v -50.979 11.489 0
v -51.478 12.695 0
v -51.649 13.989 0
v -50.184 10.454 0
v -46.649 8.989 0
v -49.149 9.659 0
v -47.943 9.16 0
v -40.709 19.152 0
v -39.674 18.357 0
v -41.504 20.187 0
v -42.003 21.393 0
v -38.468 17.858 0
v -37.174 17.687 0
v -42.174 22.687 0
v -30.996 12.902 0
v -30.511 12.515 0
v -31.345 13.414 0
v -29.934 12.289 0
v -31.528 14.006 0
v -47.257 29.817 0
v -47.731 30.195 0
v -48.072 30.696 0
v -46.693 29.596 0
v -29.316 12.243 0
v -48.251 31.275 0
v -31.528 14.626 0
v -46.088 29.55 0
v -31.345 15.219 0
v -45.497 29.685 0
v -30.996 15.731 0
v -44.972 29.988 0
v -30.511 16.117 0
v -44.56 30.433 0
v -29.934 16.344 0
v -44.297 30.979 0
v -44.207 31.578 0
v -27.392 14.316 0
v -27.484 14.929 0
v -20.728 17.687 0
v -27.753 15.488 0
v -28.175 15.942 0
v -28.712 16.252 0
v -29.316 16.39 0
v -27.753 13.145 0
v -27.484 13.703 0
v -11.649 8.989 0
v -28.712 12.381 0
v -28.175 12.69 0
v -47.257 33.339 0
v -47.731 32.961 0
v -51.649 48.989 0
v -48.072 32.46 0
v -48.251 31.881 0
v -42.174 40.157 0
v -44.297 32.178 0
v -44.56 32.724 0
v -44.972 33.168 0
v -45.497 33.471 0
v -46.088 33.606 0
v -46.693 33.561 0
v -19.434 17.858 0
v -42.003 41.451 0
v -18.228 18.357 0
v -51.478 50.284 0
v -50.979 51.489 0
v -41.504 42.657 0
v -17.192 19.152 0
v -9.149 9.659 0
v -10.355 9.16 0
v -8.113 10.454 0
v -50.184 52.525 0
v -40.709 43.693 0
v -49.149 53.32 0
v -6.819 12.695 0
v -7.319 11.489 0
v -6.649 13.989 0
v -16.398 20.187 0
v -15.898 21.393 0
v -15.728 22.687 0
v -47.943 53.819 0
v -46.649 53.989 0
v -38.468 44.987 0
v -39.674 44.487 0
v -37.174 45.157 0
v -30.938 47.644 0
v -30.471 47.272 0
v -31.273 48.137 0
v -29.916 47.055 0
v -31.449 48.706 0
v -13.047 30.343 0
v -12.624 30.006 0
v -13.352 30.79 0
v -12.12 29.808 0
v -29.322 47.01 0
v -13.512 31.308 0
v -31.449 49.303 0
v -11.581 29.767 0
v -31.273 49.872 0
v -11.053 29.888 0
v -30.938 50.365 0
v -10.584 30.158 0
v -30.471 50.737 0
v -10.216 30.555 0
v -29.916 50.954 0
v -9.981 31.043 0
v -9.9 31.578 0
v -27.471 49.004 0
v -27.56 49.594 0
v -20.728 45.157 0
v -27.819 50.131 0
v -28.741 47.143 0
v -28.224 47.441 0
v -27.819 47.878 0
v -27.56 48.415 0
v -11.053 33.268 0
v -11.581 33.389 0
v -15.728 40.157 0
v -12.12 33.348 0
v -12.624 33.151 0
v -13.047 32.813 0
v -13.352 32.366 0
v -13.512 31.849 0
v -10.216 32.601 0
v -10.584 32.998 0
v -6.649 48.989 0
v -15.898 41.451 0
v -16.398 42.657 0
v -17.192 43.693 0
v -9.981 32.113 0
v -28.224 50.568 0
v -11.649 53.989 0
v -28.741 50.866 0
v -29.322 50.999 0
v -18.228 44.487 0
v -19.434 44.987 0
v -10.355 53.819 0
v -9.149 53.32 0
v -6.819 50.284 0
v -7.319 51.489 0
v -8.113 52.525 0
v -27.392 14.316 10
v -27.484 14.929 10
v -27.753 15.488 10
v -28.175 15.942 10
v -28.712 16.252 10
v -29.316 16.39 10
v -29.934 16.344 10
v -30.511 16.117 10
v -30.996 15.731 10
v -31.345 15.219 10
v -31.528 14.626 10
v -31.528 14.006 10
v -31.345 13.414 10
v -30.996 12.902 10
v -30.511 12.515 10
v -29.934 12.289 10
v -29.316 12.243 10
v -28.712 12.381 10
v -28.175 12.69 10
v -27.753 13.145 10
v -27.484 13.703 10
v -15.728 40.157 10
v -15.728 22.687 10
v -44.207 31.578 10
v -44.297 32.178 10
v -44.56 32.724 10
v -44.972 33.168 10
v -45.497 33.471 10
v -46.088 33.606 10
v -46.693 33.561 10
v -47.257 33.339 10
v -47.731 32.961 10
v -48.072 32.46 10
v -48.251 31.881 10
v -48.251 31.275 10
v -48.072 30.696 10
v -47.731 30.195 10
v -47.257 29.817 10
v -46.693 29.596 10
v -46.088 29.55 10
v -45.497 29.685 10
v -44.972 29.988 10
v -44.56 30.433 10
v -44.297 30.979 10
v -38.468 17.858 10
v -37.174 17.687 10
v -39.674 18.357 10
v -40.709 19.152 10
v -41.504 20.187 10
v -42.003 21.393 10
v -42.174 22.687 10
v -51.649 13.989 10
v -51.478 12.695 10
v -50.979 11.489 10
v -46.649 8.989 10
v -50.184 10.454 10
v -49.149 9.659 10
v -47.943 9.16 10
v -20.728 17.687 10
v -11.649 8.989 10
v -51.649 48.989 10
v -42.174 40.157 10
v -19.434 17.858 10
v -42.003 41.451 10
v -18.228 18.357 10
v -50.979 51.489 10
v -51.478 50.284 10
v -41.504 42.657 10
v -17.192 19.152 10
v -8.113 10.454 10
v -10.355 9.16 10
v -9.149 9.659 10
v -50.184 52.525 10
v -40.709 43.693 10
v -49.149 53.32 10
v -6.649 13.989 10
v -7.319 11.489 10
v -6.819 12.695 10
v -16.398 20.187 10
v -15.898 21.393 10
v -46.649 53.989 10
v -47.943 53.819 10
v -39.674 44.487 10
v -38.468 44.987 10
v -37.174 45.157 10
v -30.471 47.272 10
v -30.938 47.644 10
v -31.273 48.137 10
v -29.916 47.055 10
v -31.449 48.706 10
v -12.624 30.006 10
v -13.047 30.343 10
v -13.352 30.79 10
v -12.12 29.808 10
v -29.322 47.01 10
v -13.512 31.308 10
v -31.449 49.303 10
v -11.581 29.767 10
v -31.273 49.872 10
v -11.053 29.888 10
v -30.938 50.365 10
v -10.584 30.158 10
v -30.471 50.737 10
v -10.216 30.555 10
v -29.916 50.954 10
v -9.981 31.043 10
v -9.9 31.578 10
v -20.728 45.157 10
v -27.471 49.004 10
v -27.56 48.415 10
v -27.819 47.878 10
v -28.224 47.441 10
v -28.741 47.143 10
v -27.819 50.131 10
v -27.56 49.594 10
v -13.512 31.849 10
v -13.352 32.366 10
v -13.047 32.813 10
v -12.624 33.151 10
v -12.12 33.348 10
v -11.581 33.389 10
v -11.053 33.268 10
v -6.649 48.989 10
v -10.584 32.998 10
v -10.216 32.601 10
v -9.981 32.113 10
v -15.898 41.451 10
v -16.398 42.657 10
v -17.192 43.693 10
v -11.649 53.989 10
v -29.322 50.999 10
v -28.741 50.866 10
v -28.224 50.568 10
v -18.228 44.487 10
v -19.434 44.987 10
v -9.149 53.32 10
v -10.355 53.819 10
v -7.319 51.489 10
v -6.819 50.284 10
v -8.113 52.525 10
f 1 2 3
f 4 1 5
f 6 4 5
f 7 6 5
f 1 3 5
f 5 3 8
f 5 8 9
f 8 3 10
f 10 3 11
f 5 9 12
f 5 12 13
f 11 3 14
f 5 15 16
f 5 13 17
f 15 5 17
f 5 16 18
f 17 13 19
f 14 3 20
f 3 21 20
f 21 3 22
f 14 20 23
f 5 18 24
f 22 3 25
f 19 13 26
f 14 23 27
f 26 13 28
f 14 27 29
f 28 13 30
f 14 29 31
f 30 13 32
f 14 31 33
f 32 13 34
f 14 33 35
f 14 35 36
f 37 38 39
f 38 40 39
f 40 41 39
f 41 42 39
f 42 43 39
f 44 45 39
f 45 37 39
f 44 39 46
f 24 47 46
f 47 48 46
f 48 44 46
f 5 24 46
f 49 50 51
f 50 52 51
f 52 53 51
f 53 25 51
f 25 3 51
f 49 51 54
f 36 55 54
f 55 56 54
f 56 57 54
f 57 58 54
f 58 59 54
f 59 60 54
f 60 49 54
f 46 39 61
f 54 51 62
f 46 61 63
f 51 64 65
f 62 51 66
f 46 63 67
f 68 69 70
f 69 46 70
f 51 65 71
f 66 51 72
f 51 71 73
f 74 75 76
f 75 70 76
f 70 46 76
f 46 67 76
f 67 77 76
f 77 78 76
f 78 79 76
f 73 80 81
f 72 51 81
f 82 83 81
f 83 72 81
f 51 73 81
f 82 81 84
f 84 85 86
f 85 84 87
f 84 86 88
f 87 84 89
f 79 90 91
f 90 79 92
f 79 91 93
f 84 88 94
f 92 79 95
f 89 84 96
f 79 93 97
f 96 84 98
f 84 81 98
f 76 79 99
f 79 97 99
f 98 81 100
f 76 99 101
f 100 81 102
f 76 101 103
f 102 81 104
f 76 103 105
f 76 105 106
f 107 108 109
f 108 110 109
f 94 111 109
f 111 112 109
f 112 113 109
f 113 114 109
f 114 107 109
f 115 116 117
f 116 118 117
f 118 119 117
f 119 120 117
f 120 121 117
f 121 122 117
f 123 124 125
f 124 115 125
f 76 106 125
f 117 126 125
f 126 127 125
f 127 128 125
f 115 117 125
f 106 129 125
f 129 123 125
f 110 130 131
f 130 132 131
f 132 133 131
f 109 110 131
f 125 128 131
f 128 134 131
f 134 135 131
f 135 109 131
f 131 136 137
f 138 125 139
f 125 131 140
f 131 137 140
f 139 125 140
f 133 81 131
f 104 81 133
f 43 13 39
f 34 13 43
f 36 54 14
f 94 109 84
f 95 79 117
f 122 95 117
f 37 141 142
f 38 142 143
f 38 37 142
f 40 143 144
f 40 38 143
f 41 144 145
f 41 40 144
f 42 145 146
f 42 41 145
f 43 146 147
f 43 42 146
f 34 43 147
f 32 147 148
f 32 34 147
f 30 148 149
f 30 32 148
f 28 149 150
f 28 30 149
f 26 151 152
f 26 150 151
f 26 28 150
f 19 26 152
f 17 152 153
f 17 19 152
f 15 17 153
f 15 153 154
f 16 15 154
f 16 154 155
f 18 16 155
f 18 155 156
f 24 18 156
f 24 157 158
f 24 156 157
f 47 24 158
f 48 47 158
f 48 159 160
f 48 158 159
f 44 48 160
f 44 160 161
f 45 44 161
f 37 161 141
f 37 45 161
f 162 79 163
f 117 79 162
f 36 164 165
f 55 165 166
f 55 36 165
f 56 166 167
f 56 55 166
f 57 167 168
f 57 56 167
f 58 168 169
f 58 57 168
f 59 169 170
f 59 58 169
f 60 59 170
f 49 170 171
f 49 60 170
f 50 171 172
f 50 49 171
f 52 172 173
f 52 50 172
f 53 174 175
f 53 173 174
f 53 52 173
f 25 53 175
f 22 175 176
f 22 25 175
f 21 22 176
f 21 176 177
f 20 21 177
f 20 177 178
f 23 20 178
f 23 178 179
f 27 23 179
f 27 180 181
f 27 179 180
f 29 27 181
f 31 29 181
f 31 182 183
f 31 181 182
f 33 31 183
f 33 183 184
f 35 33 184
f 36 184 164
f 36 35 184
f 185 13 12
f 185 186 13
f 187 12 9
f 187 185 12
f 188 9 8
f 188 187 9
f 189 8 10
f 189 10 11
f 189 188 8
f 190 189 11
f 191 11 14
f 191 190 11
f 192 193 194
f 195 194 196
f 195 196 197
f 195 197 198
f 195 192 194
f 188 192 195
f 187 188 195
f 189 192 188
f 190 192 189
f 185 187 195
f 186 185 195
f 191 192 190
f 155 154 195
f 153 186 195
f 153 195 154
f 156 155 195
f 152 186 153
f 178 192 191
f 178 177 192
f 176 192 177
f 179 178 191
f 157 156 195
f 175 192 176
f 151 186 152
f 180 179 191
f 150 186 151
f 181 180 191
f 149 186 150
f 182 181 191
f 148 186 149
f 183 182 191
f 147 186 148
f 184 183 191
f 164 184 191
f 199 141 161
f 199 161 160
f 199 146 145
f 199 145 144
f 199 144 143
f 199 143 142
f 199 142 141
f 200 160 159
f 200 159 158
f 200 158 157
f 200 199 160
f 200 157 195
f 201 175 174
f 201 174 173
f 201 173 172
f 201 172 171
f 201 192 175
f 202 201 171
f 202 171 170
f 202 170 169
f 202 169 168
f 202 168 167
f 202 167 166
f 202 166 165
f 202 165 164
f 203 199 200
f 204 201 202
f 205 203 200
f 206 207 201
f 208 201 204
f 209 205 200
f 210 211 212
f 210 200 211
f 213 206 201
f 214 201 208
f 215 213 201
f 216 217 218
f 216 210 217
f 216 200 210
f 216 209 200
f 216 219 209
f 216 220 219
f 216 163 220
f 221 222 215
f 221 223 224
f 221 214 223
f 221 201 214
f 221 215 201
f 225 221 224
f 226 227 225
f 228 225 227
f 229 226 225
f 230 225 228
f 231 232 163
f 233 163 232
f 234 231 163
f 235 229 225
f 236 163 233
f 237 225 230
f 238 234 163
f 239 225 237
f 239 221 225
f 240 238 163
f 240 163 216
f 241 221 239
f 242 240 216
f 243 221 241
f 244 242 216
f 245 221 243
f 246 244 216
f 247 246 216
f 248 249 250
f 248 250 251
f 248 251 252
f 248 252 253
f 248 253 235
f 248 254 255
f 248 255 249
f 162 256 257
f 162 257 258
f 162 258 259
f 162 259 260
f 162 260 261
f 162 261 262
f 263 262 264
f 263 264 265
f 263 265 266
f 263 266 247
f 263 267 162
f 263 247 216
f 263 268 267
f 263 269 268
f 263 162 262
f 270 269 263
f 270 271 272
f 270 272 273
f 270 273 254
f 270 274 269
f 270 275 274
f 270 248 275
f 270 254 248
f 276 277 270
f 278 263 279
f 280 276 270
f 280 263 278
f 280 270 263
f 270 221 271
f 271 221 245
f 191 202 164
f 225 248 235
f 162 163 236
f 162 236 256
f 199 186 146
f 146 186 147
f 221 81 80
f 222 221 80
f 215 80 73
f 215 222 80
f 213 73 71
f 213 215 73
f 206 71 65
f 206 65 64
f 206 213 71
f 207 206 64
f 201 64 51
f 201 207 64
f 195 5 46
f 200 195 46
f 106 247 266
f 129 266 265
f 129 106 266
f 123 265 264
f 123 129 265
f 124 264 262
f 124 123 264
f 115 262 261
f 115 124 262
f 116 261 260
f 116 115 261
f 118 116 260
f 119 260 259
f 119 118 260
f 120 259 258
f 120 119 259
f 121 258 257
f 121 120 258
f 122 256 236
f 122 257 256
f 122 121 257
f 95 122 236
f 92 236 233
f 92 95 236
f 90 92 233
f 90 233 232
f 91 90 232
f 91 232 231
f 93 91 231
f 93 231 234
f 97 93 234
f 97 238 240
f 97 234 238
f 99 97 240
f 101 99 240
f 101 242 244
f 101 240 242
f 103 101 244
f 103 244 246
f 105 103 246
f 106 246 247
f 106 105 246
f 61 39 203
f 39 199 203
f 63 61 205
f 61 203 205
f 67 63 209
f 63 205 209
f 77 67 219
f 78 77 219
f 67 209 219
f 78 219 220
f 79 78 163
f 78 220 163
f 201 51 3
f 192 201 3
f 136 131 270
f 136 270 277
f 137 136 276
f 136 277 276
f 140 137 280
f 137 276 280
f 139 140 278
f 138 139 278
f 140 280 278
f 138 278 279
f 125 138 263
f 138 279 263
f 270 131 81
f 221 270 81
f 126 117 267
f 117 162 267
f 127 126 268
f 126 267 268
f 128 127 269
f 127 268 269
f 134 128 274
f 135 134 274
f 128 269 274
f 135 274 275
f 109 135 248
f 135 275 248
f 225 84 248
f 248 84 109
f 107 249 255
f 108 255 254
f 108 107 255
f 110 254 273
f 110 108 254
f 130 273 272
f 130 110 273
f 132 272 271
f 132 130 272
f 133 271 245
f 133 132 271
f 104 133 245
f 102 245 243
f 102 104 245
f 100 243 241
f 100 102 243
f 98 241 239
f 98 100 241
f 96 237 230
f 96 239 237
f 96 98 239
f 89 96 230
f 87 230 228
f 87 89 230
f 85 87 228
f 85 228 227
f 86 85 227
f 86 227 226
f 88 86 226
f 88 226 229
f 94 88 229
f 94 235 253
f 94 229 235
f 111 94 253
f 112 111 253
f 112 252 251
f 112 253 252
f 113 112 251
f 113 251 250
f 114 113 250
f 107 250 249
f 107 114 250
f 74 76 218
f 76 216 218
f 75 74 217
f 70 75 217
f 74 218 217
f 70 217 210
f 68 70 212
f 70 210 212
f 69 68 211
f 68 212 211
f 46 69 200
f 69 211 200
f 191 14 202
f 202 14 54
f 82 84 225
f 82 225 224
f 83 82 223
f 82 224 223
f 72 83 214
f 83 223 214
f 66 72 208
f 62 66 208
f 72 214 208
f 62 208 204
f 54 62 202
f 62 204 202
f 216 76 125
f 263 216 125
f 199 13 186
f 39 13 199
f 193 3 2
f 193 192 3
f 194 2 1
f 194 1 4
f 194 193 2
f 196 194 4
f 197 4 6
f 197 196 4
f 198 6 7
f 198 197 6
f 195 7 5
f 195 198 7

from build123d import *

# Parameters (mm, degrees)
F0_W     = 23.217392
F0_H     = 21.835592
F1_DEPTH = 10
F2_W     = 26.445957
F2_H     = 27.469668
F3_DEPTH = 25
F4_R     = 5
F5_R     = 5
F6_R     = 2
F6_R_2   = 2.033505
F6_R_3   = 2.079501
F6_R_4   = 1.815846
F7_DEPTH = 25


with BuildPart() as f1:
    # F0 (on Top) → F1 (new body)
    with BuildSketch(Plane.XY):
        Polygon((-6.648776, 53.989464), (-51.648776, 53.989464), (-40.906838, 42.266803), (-17.689446, 42.266803), (-17.689446, 20.431211), (-6.648776, 8.989464), align=None)
        Polygon((-40.906838, 42.266803), (-51.648776, 53.989464), (-51.648776, 8.989464), (-6.648776, 8.989464), (-17.689446, 20.431211), (-40.906838, 20.431211), align=None)
        with Locations((-29.298142, 31.349007)):
            Rectangle(F0_W, F0_H)
    extrude(amount=F1_DEPTH)

    # F2 (on Top) → F3 (cut)
    with BuildSketch(Plane.XY):
        with Locations((-28.950831, 31.422166)):
            Rectangle(F2_W, F2_H)
    extrude(amount=F3_DEPTH, mode=Mode.SUBTRACT)

    # F4
    f4_edges = [f1.edges().sort_by_distance(p)[0] for p in [
        (-51.648776, 8.989464, 5),
        (-51.648776, 53.989464, 5),
        (-6.648776, 53.989464, 5),
        (-6.648776, 8.989464, 5),
    ]]
    fillet(f4_edges, radius=F4_R)

    # F5
    f5_edges = [f1.edges().sort_by_distance(p)[0] for p in [
        (-42.17381, 17.687332, 5),
        (-42.17381, 45.157, 5),
        (-15.727853, 45.157, 5),
        (-15.727853, 17.687332, 5),
    ]]
    fillet(f5_edges, radius=F5_R)

    # F6 (on Top) → F7 (cut)
    with BuildSketch(Plane.XY):
        with Locations((-29.471436, 49.004467)):
            Circle(F6_R)
        with Locations((-46.240133, 31.578172)):
            Circle(F6_R_2)
        with Locations((-29.471436, 14.316277)):
            Circle(F6_R_3)
        with Locations((-11.716344, 31.578172)):
            Circle(F6_R_4)
    extrude(amount=F7_DEPTH, mode=Mode.SUBTRACT)


solid = f1.part
